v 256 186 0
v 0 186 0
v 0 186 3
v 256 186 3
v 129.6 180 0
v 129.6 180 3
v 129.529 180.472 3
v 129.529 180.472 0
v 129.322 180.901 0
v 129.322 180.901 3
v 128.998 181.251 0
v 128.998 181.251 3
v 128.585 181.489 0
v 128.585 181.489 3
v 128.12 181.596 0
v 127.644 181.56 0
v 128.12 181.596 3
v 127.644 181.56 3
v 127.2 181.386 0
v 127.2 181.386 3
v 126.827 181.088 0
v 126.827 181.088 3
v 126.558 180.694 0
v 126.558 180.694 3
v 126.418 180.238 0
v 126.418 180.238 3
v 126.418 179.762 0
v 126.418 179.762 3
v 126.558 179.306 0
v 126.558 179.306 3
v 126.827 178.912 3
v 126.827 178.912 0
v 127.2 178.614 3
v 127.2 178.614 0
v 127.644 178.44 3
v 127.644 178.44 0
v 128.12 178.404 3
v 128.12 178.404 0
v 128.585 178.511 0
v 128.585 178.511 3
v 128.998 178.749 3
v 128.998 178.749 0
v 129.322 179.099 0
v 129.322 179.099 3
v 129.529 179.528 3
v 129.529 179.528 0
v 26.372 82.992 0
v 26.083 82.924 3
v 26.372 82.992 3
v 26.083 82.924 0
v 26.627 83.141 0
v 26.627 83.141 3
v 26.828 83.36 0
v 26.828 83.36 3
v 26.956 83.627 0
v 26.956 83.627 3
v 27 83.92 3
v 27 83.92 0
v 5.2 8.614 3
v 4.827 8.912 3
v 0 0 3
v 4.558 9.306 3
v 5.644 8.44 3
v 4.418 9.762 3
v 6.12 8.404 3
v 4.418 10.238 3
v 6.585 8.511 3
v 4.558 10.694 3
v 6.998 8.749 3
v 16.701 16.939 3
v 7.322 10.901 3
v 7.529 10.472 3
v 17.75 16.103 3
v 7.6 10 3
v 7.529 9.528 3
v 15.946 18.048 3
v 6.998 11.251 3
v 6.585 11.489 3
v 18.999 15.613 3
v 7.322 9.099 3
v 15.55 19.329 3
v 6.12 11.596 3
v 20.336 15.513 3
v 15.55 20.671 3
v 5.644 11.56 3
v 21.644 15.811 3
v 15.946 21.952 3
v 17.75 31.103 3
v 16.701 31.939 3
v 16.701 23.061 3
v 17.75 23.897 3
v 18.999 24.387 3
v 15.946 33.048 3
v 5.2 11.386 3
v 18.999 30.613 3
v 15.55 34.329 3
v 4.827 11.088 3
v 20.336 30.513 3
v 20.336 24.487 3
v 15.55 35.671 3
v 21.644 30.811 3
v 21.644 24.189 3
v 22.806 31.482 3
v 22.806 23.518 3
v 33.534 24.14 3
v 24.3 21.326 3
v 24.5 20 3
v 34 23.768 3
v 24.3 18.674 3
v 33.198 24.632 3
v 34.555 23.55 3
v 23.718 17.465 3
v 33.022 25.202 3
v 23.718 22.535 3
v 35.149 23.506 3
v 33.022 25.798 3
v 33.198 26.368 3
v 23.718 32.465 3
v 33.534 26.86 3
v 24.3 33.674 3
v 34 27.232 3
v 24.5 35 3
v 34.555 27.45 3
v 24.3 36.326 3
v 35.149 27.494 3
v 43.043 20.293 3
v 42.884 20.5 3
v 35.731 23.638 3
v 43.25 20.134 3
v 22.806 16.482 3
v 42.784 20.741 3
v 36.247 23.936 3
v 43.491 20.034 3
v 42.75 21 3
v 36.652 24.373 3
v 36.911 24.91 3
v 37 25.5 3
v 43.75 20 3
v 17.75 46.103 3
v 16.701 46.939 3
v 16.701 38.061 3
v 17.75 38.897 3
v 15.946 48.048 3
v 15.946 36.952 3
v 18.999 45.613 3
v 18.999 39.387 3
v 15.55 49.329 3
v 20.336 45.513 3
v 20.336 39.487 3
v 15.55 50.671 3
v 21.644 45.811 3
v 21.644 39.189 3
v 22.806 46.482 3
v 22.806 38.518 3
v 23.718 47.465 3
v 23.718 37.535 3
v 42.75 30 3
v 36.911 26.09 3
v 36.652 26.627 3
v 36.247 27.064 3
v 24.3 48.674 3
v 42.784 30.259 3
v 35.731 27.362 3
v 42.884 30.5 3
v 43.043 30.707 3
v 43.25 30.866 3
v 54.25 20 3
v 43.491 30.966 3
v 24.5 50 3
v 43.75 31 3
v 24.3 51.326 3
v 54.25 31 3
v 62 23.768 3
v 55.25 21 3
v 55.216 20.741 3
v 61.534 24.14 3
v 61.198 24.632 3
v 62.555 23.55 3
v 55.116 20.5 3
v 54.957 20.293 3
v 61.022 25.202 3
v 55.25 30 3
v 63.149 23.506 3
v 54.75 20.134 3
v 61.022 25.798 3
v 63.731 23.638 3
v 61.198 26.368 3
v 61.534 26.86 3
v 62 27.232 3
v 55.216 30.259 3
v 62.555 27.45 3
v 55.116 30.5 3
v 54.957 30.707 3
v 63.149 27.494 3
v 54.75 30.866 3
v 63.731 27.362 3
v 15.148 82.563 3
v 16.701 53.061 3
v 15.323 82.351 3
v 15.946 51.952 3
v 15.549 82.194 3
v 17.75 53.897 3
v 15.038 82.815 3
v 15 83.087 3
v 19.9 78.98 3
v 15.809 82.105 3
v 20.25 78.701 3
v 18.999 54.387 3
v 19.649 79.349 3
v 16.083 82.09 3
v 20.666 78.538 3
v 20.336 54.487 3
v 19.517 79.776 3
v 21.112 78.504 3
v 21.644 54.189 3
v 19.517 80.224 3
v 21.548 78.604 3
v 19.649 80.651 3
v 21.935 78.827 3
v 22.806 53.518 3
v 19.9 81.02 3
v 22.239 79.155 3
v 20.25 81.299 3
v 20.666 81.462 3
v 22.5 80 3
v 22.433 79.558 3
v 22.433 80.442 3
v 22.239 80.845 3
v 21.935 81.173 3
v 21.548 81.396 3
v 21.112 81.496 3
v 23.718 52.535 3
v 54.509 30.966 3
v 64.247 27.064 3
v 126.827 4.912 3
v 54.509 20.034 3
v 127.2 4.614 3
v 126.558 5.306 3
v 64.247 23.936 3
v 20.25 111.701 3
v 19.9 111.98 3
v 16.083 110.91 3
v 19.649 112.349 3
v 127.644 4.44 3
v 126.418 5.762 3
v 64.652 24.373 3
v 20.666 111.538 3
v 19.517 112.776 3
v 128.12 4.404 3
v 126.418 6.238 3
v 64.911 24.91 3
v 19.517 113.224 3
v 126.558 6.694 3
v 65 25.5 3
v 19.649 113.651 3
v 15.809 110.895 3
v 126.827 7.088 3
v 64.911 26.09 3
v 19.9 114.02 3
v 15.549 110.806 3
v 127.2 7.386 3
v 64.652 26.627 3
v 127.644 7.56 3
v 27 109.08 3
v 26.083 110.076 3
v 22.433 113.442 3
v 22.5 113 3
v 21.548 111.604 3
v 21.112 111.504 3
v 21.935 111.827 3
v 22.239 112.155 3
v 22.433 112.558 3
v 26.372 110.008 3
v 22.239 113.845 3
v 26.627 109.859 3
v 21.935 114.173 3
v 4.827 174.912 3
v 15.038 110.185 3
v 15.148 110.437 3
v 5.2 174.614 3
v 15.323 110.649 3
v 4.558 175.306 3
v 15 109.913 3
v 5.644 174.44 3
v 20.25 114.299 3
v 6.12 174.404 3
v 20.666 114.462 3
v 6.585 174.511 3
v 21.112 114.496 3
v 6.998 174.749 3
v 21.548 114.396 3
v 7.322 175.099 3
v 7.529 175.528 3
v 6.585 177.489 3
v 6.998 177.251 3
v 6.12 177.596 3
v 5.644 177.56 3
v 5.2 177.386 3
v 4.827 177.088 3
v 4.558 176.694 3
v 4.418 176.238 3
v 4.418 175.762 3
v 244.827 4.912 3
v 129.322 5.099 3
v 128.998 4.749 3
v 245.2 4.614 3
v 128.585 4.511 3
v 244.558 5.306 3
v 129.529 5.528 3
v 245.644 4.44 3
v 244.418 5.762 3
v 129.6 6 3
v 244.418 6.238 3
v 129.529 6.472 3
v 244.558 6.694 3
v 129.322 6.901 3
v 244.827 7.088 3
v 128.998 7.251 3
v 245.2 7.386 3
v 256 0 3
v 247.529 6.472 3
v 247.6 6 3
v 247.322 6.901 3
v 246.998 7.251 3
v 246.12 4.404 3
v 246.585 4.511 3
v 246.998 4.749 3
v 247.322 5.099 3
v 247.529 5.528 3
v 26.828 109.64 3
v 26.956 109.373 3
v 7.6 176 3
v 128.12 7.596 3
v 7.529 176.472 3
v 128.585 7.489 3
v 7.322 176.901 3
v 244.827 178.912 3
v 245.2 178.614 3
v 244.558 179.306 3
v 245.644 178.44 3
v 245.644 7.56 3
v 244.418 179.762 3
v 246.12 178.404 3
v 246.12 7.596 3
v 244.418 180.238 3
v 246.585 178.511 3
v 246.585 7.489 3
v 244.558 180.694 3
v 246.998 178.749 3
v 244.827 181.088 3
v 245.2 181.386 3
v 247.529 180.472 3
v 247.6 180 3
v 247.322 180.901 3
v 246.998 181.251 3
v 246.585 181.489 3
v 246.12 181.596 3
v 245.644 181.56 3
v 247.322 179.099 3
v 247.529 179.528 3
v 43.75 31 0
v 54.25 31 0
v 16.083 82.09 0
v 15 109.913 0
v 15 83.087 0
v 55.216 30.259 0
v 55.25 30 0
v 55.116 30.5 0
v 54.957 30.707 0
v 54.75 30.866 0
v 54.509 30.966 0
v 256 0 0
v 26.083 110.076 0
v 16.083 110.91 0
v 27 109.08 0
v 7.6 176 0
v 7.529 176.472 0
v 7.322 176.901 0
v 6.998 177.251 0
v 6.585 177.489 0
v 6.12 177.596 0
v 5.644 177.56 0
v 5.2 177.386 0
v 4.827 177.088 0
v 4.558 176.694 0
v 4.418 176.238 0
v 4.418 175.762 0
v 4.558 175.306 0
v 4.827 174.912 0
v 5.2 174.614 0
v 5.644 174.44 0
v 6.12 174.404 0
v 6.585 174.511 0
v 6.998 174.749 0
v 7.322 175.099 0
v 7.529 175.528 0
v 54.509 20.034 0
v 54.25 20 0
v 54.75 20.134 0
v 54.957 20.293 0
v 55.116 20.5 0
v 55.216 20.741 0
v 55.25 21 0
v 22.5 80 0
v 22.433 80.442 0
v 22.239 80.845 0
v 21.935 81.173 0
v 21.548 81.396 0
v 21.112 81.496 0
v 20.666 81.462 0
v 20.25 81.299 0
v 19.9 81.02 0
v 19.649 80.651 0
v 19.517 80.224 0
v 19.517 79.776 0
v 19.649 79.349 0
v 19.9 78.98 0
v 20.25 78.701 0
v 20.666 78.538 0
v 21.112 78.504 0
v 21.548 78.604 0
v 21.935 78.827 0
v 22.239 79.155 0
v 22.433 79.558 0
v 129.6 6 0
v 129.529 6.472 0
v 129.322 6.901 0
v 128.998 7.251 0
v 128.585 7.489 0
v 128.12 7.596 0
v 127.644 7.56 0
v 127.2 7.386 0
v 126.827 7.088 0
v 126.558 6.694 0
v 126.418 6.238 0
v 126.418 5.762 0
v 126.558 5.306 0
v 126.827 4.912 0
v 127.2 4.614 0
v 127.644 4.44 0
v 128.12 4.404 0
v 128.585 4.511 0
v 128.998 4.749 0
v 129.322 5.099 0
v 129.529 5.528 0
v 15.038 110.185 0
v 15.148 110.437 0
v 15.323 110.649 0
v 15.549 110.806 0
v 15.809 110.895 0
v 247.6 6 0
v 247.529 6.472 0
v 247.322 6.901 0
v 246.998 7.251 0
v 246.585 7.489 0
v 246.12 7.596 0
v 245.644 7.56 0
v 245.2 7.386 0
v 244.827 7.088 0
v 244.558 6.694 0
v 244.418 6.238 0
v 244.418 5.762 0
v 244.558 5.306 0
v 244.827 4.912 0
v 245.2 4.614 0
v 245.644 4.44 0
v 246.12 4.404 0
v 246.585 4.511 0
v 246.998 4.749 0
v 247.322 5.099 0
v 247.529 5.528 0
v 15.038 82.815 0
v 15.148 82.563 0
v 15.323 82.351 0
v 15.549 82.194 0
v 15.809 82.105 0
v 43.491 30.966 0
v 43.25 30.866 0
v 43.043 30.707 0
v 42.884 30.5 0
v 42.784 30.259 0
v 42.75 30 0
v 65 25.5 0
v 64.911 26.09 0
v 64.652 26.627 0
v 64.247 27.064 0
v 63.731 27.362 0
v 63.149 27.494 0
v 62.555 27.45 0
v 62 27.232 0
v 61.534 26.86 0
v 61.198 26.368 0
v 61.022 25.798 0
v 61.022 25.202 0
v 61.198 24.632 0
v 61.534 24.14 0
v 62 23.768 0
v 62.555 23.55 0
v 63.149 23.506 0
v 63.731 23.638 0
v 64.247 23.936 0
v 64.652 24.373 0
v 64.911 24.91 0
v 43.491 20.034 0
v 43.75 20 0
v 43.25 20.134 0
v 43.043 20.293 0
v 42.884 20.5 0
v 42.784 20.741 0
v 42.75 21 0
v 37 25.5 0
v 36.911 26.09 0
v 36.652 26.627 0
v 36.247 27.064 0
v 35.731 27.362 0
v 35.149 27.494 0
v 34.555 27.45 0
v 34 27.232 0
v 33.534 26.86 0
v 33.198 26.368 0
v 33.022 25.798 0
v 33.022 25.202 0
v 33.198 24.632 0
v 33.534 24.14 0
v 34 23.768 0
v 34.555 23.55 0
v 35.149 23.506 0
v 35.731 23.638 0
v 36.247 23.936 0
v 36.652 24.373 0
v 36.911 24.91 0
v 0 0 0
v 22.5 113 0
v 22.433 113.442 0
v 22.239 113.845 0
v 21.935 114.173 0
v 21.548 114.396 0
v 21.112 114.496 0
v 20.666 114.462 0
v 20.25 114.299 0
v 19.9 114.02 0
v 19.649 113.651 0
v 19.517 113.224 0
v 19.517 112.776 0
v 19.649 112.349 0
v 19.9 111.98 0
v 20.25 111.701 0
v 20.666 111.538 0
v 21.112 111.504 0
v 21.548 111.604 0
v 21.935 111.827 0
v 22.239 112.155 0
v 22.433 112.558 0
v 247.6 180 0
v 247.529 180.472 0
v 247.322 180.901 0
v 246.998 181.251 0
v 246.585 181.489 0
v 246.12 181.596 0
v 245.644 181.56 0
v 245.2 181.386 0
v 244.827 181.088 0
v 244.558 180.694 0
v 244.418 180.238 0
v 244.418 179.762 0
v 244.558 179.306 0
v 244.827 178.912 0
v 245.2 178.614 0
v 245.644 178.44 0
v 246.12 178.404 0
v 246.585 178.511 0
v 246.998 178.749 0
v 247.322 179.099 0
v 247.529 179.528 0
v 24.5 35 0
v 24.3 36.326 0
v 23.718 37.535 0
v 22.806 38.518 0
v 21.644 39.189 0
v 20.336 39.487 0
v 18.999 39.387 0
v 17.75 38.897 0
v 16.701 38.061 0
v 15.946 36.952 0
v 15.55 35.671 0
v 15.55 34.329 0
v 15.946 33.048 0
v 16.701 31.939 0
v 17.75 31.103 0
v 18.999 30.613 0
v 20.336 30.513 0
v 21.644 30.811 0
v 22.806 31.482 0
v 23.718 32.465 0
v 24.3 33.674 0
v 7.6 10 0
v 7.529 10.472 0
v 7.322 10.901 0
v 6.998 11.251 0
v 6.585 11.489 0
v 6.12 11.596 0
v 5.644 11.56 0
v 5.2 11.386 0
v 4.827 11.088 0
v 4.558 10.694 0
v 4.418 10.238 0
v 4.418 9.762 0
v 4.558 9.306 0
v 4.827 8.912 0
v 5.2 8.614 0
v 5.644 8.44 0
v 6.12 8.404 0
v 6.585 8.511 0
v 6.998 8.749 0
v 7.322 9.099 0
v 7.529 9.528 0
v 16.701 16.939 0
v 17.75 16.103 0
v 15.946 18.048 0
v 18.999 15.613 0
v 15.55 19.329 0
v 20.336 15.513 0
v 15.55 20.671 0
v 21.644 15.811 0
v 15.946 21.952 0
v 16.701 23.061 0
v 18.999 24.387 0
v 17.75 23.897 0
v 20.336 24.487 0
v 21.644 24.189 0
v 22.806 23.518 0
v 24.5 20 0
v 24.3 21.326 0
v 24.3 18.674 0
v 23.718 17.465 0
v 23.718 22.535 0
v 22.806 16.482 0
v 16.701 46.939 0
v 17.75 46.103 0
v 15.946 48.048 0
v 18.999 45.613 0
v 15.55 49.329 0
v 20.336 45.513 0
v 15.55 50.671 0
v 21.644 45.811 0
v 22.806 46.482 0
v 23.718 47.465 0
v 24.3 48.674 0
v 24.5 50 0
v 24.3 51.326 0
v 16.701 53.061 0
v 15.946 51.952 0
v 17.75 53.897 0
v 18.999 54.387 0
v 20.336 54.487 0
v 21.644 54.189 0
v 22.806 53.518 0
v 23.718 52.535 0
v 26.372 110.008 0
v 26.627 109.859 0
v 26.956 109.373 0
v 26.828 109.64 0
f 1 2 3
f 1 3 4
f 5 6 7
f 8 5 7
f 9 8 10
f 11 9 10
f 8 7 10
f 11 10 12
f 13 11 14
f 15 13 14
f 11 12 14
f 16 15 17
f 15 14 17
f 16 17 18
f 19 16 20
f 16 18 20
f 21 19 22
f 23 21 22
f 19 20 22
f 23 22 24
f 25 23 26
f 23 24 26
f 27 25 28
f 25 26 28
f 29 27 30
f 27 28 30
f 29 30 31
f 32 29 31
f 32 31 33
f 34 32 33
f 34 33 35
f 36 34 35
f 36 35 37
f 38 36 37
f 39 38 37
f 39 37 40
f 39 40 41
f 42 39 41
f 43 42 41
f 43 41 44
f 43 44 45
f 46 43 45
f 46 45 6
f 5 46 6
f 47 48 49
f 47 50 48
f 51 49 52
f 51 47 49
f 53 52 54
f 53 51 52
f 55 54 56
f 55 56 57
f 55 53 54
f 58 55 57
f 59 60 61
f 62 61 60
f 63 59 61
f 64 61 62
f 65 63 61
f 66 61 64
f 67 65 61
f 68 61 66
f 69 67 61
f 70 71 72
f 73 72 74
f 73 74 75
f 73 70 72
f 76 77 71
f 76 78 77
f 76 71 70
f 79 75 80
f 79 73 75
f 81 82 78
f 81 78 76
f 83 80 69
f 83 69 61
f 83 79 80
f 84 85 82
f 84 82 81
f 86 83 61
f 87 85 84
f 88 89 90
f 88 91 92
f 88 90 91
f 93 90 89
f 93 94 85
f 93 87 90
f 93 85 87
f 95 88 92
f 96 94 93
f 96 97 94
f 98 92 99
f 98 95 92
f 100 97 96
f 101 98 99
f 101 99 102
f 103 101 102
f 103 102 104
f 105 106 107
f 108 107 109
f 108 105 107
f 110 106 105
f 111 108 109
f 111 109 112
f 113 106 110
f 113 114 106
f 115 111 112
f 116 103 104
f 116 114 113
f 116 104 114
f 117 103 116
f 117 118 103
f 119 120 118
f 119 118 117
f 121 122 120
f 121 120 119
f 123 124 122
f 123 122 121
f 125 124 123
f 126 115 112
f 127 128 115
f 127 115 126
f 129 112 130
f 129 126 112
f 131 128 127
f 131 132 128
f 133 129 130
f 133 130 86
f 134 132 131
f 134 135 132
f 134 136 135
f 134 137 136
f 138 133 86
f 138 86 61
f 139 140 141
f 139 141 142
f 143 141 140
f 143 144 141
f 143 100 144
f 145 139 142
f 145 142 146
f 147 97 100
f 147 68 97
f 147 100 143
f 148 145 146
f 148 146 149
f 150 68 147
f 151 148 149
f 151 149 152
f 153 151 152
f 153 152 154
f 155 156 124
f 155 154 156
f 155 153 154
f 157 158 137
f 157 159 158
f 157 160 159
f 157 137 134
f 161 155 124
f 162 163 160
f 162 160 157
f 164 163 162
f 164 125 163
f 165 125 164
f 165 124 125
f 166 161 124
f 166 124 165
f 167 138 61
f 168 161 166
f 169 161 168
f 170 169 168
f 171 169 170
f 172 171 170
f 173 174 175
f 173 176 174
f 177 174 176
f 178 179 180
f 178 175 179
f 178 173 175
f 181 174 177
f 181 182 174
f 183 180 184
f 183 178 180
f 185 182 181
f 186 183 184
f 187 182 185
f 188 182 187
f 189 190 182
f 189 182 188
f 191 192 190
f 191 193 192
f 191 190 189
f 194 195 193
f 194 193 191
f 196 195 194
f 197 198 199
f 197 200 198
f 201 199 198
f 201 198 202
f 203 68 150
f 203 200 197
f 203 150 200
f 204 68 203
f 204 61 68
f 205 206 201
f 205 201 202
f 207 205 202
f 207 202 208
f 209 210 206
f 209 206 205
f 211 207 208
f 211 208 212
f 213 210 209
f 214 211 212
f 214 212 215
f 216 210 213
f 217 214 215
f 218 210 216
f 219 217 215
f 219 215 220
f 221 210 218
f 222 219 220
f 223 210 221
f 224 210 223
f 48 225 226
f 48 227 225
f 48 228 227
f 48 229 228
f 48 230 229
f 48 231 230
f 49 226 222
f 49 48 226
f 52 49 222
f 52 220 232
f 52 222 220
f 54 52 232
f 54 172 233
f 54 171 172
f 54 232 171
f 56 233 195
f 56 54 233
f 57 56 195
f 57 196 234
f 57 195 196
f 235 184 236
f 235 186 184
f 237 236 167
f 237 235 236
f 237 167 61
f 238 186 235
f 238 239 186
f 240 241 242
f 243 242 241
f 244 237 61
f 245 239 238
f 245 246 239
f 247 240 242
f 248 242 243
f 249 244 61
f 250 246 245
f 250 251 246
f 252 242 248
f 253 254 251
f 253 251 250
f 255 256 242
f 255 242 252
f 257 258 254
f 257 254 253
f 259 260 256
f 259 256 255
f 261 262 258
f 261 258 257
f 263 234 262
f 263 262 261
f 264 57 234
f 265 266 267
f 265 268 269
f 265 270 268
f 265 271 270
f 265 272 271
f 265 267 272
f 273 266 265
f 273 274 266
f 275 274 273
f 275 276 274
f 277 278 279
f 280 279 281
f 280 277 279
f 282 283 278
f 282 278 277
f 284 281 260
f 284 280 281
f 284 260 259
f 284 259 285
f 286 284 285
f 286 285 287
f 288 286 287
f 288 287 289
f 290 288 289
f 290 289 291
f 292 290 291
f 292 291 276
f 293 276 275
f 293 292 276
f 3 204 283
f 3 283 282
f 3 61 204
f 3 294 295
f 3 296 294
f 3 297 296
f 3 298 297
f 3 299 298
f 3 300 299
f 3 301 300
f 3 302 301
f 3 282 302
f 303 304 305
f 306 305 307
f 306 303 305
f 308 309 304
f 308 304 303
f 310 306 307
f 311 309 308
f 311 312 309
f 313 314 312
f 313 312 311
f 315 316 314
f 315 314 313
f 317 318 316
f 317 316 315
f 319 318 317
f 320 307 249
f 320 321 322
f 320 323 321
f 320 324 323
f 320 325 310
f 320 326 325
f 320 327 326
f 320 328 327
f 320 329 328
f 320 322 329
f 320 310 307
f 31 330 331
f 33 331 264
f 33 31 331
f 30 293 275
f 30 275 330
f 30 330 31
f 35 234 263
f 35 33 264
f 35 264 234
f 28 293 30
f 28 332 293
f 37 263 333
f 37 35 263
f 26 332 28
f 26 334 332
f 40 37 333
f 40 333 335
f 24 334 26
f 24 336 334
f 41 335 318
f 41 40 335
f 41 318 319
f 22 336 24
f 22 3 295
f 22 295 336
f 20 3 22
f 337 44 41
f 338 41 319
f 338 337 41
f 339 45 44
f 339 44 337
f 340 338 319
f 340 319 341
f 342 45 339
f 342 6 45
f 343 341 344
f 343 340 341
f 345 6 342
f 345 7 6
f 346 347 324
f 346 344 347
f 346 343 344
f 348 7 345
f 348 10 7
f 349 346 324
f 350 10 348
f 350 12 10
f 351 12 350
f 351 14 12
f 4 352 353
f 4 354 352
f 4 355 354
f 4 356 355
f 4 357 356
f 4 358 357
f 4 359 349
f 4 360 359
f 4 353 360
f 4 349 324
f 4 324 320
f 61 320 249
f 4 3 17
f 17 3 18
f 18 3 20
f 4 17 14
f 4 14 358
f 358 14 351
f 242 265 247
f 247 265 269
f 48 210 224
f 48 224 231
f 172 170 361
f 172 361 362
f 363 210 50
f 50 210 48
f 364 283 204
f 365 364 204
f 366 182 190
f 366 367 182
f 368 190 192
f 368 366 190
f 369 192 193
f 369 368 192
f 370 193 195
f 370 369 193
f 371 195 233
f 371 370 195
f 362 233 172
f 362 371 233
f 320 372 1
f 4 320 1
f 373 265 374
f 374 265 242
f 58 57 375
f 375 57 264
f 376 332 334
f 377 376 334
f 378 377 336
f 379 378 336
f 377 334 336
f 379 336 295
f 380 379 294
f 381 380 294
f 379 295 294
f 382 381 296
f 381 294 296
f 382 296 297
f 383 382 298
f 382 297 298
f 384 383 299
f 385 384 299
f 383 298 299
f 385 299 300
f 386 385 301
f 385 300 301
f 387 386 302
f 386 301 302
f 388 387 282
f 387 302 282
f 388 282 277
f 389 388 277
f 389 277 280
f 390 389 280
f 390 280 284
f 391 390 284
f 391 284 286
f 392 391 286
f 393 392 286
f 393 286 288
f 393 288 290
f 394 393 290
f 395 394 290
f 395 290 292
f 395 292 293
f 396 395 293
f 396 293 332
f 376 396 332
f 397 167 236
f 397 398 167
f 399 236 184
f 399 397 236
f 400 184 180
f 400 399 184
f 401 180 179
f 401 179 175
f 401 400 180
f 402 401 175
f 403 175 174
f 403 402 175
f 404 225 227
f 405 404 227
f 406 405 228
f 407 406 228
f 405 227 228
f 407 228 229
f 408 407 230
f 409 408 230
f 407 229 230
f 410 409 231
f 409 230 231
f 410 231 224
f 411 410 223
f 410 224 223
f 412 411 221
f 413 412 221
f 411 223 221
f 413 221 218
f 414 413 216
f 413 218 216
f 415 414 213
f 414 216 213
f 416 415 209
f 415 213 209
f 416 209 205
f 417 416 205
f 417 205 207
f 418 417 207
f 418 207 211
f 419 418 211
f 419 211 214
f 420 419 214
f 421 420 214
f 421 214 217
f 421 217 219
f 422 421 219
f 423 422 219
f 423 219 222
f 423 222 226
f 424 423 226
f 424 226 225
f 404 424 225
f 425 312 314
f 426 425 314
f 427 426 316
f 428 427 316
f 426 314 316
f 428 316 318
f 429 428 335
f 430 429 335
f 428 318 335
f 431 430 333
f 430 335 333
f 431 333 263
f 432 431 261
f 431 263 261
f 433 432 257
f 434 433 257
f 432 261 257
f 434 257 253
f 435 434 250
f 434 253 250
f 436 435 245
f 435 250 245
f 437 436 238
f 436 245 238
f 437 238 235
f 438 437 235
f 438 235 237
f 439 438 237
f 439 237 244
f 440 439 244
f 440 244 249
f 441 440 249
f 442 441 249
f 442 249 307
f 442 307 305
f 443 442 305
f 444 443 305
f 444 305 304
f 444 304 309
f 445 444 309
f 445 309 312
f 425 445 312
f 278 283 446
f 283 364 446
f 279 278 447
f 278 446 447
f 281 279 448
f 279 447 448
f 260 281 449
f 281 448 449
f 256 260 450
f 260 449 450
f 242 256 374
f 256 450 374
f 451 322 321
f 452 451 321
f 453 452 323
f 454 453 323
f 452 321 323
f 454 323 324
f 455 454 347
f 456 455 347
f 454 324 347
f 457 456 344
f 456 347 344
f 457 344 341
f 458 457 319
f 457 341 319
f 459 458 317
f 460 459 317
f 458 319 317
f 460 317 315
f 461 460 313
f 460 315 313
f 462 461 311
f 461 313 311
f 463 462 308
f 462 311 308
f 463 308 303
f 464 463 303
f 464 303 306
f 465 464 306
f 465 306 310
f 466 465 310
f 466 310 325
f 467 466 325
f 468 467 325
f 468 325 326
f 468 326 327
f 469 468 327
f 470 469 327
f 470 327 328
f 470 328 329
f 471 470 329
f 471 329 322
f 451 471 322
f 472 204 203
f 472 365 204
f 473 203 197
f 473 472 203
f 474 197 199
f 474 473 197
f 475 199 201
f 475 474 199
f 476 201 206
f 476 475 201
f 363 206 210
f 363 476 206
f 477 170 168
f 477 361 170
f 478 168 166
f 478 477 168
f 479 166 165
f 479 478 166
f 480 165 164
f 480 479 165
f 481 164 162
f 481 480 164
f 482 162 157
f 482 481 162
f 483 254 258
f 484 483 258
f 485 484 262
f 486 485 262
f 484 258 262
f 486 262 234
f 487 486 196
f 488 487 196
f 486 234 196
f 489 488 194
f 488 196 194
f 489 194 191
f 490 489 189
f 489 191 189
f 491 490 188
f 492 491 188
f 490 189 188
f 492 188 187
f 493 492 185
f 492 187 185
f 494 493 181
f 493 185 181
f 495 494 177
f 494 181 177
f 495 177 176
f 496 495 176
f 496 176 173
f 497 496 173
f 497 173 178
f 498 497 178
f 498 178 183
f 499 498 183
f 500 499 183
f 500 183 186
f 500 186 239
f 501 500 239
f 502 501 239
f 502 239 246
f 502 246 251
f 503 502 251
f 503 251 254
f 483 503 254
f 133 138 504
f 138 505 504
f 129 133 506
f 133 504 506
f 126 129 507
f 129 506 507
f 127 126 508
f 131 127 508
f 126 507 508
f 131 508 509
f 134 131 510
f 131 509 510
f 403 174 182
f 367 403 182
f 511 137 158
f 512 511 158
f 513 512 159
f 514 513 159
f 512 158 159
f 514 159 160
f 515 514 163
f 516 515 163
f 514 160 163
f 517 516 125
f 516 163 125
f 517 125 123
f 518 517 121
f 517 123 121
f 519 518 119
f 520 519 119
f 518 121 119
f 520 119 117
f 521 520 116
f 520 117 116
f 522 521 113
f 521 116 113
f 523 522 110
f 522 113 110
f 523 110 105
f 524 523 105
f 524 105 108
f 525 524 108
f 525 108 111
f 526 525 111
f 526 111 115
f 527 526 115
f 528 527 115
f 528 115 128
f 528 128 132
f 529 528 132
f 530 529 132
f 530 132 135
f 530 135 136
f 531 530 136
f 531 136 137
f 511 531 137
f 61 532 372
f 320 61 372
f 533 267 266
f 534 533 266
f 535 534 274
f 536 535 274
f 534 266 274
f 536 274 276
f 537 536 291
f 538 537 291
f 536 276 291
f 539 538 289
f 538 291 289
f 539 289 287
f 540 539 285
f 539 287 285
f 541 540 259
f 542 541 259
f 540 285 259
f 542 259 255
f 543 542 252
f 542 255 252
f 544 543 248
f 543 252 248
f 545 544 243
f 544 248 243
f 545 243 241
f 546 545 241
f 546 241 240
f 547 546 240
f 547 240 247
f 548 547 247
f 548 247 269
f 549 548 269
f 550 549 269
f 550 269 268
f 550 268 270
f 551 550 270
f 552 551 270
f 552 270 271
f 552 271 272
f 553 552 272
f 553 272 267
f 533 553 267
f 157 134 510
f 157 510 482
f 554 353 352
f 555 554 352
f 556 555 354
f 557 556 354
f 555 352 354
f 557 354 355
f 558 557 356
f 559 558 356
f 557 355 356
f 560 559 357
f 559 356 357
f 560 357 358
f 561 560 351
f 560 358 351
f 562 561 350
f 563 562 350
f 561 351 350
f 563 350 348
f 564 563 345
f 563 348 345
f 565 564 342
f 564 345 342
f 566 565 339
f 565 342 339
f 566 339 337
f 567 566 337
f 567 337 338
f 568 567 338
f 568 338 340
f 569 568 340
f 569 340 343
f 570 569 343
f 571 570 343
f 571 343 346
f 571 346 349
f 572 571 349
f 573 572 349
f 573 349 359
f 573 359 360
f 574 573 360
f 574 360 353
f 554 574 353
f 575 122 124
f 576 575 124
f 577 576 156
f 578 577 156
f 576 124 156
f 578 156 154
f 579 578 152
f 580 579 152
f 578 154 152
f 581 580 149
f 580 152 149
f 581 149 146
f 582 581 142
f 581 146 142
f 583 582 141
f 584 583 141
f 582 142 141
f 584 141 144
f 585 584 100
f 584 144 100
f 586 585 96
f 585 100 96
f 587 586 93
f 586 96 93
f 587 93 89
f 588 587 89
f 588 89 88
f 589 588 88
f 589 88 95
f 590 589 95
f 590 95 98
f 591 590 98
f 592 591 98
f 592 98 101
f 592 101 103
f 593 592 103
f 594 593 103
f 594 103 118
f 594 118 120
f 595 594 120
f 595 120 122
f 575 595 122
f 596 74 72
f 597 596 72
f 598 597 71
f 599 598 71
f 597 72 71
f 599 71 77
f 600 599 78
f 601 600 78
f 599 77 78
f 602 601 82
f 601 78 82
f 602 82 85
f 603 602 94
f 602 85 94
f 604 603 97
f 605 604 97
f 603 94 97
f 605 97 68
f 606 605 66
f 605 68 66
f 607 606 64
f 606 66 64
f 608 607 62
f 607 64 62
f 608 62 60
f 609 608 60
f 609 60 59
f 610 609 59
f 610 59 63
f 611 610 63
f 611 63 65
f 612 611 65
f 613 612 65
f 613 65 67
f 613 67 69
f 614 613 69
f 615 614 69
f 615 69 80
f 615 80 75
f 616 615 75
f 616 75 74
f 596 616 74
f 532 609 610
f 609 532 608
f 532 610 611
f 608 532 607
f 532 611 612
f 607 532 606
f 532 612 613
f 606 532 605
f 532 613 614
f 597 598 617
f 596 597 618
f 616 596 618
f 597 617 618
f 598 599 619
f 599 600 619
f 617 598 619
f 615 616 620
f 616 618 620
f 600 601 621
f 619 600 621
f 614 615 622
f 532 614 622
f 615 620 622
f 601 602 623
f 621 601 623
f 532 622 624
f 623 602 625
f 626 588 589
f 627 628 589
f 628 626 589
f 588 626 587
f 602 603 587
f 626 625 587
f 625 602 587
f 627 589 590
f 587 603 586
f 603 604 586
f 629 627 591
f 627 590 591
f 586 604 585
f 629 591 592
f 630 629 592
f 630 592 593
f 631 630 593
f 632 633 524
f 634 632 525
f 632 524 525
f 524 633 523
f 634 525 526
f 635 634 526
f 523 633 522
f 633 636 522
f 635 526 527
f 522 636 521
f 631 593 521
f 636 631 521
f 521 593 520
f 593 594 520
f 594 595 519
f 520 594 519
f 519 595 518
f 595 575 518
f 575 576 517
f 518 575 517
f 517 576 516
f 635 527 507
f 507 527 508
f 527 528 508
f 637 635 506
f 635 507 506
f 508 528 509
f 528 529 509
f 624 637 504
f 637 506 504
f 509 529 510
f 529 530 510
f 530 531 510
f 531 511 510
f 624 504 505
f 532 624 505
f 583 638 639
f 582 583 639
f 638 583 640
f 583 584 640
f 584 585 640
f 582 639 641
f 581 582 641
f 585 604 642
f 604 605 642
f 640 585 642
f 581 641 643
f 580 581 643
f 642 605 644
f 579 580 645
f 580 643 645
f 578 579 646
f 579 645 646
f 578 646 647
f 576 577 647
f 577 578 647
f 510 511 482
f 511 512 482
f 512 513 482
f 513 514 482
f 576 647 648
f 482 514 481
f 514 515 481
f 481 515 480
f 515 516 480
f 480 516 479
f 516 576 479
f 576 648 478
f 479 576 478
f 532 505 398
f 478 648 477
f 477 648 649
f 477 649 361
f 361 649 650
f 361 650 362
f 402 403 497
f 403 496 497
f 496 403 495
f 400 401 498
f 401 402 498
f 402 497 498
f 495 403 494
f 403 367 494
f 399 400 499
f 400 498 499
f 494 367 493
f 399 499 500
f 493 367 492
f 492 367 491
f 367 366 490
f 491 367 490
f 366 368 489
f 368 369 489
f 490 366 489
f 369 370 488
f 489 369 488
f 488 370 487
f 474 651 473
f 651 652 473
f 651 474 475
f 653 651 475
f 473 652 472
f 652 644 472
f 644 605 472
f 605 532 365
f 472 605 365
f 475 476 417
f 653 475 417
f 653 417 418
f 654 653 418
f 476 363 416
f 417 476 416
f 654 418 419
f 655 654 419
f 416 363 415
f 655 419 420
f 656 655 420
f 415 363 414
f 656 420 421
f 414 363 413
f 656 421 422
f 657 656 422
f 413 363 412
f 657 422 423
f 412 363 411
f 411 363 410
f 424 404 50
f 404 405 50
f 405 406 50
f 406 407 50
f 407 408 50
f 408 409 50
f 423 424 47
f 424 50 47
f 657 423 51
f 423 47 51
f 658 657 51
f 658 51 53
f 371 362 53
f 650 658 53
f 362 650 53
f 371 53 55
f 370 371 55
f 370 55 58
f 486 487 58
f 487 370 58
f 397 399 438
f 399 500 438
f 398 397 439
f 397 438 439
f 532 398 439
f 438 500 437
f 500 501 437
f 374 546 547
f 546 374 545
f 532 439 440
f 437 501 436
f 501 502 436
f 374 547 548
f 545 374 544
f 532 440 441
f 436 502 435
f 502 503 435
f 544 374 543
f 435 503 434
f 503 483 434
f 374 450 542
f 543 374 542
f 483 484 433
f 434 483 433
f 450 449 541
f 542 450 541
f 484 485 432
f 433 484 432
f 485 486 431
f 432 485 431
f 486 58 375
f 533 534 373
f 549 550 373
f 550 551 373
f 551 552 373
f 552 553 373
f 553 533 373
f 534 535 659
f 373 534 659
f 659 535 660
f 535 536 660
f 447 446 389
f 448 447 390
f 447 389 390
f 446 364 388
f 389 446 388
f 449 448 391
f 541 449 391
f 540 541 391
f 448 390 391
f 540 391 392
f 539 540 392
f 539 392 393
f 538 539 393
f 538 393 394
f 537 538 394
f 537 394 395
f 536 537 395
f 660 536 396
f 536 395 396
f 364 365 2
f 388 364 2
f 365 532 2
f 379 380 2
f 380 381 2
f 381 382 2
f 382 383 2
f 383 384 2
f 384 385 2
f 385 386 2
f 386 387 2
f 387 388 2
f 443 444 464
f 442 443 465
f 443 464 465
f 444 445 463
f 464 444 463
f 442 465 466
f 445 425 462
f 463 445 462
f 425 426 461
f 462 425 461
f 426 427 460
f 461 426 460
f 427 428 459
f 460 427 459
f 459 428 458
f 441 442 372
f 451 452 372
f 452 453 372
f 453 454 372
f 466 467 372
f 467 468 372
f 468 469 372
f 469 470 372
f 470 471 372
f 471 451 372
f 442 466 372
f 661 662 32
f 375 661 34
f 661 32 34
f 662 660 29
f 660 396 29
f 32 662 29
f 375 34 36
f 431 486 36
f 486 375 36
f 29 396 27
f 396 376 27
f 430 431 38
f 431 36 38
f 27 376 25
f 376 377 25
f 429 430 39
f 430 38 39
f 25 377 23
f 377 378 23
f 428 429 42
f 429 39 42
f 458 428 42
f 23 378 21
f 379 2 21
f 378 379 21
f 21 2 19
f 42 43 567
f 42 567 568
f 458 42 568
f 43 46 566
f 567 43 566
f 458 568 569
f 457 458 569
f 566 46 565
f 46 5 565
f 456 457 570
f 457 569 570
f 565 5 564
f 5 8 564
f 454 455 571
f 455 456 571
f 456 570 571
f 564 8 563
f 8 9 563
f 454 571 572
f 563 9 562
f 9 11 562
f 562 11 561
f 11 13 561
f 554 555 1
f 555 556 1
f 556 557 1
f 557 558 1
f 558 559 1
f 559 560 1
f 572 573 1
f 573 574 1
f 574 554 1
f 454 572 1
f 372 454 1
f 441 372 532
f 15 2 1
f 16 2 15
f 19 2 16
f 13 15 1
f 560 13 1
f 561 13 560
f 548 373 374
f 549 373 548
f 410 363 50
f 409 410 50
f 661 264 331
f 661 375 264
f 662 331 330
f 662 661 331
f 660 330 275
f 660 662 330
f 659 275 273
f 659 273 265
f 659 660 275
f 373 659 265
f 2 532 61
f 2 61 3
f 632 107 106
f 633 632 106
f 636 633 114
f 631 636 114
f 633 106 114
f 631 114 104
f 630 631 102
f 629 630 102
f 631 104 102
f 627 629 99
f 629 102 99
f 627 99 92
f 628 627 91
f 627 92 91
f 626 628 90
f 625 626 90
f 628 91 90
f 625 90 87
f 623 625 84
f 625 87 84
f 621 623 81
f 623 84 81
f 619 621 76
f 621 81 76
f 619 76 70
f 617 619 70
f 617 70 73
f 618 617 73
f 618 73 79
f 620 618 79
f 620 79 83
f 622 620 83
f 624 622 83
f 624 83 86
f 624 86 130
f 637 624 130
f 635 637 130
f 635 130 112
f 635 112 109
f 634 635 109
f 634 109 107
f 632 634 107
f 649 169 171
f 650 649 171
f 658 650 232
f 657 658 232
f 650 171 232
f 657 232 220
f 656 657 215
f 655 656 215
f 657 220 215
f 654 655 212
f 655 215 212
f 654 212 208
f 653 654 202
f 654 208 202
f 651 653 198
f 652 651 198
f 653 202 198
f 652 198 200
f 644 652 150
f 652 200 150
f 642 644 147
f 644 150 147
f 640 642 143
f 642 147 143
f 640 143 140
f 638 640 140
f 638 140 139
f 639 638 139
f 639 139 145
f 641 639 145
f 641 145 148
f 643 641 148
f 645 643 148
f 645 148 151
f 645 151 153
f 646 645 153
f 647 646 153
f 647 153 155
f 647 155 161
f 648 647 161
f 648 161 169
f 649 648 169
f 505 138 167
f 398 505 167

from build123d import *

# Parameters (mm, degrees)
SKETCH2_W           = 256
SKETCH2_H           = 186
BOSS_EXTRUDE1_DEPTH = 3
SKETCH3_R           = 1.6
CUT_EXTRUDE1_DEPTH  = 4
SKETCH4_R           = 2
SKETCH4_W           = 12.5
SKETCH4_H           = 11
CUT_EXTRUDE2_DEPTH  = 10
FILLET1_R           = 1
SKETCH5_R           = 4.5
CUT_EXTRUDE3_DEPTH  = 10
SKETCH7_R           = 1.5
CUT_EXTRUDE4_DEPTH  = 4
FILLET2_R           = 1


with BuildPart() as part:
    # Sketch2 → Boss-Extrude1 (new body)
    with BuildSketch(Plane.XY):
        with Locations((128, 93)):
            Rectangle(SKETCH2_W, SKETCH2_H)
    extrude(amount=BOSS_EXTRUDE1_DEPTH)

    # Sketch3 → Cut-Extrude1 (cut, through all)
    with BuildSketch(Plane.XY.offset(3)):
        with Locations((6, 176)):
            Circle(SKETCH3_R)
        with Locations((128, 180)):
            Circle(SKETCH3_R)
        with Locations((246, 180)):
            Circle(SKETCH3_R)
        with Locations((246, 6)):
            Circle(SKETCH3_R)
        with Locations((128, 6)):
            Circle(SKETCH3_R)
        with Locations((6, 10)):
            Circle(SKETCH3_R)
    extrude(amount=-CUT_EXTRUDE1_DEPTH, mode=Mode.SUBTRACT)

    # Sketch4 → Cut-Extrude2 (cut)
    with BuildSketch(Plane.XY.offset(3)):
        with Locations((35, 25.5)):
            Circle(SKETCH4_R)
        with Locations((63, 25.5)):
            Circle(SKETCH4_R)
        with Locations((49, 25.5)):
            Rectangle(SKETCH4_W, SKETCH4_H)
    extrude(amount=-CUT_EXTRUDE2_DEPTH, mode=Mode.SUBTRACT)

    # Fillet1
    fillet1_edges = [part.edges().sort_by_distance(p)[0] for p in [
        (42.75, 20, 1.5),
        (42.75, 31, 1.5),
        (55.25, 31, 1.5),
        (55.25, 20, 1.5),
    ]]
    fillet(fillet1_edges, radius=FILLET1_R)

    # Sketch5 → Cut-Extrude3 (cut)
    with BuildSketch(Plane.XY.offset(3)):
        with Locations((20, 35)):
            Circle(SKETCH5_R)
        with Locations((20, 20)):
            Circle(SKETCH5_R)
        with Locations((20, 50)):
            Circle(SKETCH5_R)
    extrude(amount=-CUT_EXTRUDE3_DEPTH, mode=Mode.SUBTRACT)

    # Sketch7 → Cut-Extrude4 (cut, through all)
    with BuildSketch(Plane(origin=(161.992525703, 0.203186411, 3), x_dir=(1, 0, 0), z_dir=(0, 0, 1))):
        with Locations((-140.992525703, 112.796813589)):
            Circle(SKETCH7_R)
        with Locations((-140.992525703, 79.796813589)):
            Circle(SKETCH7_R)
        Polygon((-146.992525703, 110.796813589), (-146.992525703, 81.796813589), (-134.992525703, 82.796813589), (-134.992525703, 109.796813589), align=None)
    extrude(amount=-CUT_EXTRUDE4_DEPTH, mode=Mode.SUBTRACT)

    # Fillet2
    fillet2_edges = [part.edges().sort_by_distance(p)[0] for p in [
        (15, 111, 1.5),
        (27, 110, 1.5),
        (27, 83, 1.5),
        (15, 82, 1.5),
    ]]
    fillet(fillet2_edges, radius=FILLET2_R)


solid = part.part
